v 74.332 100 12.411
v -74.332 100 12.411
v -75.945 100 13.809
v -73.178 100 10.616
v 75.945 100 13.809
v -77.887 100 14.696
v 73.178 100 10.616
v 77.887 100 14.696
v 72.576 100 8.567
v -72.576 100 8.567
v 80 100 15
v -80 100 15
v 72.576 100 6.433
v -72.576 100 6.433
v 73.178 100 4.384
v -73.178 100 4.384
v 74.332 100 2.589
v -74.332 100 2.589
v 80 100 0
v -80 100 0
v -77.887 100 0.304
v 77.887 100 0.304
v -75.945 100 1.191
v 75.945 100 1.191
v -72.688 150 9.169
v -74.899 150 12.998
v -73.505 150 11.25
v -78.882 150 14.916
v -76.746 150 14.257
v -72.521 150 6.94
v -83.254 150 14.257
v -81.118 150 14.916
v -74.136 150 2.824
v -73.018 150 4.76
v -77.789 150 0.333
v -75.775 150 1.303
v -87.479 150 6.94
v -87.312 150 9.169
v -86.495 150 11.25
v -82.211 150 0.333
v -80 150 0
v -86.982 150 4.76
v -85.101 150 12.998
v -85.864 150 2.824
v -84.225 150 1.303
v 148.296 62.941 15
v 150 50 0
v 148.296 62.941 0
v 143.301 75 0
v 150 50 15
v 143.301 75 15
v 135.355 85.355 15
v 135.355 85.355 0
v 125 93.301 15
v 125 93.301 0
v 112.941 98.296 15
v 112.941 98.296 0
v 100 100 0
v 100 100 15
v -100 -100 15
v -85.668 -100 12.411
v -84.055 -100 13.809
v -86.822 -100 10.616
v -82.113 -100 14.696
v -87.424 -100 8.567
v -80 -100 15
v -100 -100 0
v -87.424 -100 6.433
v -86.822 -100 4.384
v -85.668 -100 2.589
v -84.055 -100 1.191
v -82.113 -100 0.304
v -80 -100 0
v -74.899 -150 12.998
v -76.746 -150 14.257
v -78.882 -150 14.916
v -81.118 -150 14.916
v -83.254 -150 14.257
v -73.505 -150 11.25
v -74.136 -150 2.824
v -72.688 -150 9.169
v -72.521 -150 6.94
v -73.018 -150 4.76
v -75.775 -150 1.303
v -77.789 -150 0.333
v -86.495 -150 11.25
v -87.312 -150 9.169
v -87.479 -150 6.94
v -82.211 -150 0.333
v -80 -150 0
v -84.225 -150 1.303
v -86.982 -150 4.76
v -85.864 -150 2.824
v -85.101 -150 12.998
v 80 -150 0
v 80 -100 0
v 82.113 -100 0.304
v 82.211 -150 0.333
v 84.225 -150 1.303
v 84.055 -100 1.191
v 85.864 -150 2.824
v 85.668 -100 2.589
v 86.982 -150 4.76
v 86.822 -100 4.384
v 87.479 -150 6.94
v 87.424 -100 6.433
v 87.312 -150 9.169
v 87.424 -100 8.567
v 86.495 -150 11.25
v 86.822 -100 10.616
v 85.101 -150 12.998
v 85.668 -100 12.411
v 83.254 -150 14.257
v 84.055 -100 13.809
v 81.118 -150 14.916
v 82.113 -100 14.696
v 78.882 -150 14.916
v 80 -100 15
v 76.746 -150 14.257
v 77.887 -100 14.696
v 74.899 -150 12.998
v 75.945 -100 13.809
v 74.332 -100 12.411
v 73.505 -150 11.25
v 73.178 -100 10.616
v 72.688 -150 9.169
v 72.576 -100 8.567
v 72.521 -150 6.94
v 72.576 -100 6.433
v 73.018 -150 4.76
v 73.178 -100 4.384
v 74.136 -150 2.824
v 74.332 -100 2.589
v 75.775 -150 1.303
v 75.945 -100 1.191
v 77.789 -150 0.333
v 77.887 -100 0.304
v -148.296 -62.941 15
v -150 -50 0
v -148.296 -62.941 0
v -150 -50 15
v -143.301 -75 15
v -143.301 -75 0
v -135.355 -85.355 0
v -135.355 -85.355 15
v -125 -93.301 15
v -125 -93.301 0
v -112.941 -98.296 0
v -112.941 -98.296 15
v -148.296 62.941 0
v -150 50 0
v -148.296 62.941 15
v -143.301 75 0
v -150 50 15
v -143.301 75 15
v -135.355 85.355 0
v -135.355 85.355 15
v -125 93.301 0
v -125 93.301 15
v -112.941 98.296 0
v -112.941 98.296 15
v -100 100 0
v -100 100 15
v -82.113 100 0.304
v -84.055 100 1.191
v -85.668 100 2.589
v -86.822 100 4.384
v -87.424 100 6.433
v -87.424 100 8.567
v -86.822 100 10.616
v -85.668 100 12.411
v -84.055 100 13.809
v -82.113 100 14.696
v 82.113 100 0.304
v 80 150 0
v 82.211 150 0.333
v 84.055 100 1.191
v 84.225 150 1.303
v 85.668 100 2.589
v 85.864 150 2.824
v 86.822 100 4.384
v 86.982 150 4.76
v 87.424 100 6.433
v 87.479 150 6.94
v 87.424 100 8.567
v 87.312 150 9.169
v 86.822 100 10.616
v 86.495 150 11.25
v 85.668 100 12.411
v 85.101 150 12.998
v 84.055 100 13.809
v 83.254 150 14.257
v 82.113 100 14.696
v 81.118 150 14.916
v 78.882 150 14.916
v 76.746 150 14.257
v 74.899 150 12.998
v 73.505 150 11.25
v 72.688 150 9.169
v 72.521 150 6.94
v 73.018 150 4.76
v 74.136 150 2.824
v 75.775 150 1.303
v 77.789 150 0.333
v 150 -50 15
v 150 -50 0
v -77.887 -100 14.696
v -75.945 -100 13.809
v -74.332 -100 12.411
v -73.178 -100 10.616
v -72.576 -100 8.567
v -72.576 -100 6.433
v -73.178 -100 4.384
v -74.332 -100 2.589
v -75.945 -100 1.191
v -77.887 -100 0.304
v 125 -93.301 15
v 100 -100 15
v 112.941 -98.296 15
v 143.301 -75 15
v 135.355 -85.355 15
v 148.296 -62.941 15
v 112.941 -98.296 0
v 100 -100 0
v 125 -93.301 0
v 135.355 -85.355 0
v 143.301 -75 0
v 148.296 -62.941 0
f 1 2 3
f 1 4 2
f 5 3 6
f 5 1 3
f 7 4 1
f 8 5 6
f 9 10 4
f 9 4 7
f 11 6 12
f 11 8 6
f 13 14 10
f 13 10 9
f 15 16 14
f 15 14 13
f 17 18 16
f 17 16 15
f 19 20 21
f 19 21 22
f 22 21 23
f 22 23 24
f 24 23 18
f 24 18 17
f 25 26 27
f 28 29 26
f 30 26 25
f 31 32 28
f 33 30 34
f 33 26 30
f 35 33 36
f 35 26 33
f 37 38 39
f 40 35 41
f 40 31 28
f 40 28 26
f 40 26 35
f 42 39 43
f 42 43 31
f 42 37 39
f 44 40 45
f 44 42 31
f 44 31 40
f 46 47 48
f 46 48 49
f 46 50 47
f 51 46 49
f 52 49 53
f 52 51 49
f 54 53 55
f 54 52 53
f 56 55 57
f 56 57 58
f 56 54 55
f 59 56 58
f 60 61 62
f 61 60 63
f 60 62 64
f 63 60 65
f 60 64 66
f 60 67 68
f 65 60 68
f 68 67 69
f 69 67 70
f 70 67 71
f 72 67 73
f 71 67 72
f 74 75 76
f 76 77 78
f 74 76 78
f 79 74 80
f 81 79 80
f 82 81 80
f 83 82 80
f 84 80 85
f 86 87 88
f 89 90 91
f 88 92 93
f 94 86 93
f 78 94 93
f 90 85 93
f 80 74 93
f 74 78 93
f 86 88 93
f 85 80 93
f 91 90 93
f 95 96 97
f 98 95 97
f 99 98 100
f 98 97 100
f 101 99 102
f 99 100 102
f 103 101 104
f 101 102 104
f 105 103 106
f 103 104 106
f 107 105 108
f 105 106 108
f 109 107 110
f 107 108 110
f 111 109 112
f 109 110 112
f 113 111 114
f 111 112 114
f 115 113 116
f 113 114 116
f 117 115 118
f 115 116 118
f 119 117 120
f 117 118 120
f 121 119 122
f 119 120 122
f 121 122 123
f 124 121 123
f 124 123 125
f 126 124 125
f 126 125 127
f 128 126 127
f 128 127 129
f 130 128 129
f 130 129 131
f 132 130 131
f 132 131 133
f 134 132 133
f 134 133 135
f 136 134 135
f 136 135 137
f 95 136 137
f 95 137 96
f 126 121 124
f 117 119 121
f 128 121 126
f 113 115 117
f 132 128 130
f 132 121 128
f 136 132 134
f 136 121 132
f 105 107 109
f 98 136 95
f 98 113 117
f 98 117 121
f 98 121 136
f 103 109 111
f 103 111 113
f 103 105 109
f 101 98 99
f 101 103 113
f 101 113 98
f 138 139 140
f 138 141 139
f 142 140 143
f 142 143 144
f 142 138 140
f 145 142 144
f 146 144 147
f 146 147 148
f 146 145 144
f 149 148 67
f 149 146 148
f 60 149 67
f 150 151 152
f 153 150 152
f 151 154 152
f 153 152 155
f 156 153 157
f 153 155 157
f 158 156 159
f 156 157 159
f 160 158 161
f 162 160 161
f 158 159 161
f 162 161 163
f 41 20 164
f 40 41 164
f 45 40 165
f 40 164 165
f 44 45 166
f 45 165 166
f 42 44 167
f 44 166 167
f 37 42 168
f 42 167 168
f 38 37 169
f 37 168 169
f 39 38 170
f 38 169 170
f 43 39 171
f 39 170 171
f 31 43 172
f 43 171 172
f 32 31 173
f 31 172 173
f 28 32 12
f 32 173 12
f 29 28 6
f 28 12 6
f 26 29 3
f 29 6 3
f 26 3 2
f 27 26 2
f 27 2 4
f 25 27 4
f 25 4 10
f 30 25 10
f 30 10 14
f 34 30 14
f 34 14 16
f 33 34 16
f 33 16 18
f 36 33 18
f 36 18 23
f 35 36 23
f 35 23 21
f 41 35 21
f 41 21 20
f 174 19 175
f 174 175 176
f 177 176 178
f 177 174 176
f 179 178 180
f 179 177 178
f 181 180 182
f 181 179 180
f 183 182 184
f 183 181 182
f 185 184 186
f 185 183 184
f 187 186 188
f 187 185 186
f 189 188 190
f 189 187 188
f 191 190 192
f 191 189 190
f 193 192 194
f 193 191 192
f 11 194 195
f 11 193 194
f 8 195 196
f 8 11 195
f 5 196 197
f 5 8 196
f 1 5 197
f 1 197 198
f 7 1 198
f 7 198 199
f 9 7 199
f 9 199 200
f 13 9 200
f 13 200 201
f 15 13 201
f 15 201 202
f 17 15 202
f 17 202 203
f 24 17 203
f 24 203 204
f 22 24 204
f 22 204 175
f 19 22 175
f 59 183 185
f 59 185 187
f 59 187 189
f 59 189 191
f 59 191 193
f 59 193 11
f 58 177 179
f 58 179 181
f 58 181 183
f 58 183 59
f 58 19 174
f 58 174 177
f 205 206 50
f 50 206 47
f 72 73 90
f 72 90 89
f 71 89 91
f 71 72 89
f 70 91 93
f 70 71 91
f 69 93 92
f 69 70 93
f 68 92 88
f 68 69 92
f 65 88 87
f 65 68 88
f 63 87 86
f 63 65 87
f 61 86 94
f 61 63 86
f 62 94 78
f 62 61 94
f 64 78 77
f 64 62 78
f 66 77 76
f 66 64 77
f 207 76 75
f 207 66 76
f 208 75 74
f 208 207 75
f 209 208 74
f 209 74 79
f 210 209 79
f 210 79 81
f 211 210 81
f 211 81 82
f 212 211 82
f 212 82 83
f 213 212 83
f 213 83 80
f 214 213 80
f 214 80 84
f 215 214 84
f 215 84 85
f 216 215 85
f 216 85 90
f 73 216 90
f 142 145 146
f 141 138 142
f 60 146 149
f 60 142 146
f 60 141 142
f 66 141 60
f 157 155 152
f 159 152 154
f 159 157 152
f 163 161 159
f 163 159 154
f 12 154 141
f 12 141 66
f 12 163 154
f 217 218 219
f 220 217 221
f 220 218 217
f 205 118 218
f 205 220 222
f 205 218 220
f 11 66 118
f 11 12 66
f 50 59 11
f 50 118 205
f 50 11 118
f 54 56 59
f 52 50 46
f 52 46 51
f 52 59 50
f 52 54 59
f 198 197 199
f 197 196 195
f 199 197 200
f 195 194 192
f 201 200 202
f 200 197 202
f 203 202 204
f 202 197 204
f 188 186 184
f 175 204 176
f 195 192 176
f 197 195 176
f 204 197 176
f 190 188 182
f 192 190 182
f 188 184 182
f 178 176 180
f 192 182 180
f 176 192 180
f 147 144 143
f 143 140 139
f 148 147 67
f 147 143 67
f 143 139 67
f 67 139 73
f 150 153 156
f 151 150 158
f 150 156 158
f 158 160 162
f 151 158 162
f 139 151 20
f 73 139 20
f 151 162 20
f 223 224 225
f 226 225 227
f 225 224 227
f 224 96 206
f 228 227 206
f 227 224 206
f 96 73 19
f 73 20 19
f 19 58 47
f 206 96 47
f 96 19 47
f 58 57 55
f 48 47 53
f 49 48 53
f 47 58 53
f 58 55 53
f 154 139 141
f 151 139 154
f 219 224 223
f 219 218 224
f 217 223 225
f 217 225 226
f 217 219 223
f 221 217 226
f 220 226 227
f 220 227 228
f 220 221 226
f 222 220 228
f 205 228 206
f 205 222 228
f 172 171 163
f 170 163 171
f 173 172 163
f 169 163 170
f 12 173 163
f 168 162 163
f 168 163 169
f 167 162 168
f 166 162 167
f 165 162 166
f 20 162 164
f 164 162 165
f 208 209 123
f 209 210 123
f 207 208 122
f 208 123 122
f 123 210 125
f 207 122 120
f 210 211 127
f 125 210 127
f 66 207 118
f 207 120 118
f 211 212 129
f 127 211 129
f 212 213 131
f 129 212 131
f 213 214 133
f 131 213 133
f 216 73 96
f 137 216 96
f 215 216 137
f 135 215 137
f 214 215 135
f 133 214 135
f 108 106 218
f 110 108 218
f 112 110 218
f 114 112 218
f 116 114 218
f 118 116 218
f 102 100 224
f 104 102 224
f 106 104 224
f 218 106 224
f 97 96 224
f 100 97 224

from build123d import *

# Parameters (mm, degrees)
SKETCH3_W               = 300
SKETCH3_H               = 200
BOSS_EXTRUDE1_DEPTH     = 15
FILLET1_R               = 50
SKETCH7_R               = 7.5
BOSS_EXTRUDE2_DEPTH     = 50
MIRROR2_COPY_1_SKETCH_R = 7.5
MIRROR2_COPY_1_DEPTH    = 50


with BuildPart() as part:
    # Sketch3 → Boss-Extrude1 (new body)
    with BuildSketch(Plane.XY):
        Rectangle(SKETCH3_W, SKETCH3_H)
    extrude(amount=BOSS_EXTRUDE1_DEPTH)

    # Fillet1
    fillet1_edges = [part.edges().sort_by_distance(p)[0] for p in [
        (150, -100, 7.5),
        (-150, -100, 7.5),
        (-150, 100, 7.5),
        (150, 100, 7.5),
    ]]
    fillet(fillet1_edges, radius=FILLET1_R)

    # Sketch7 → Boss-Extrude2 (add)
    with BuildSketch(Plane.XZ.offset(100)):
        with Locations(Location((80, 7.5, 0), (0, 0, 270))):
            Circle(SKETCH7_R)
    boss_extrude2 = extrude(amount=BOSS_EXTRUDE2_DEPTH)

    # Mirror1: Boss-Extrude2 across plane
    add(boss_extrude2.mirror(Plane(origin=(0, 0, 0), x_dir=(0, 0, 1), z_dir=(1, 0, 0))))

    # Mirror2: Boss-Extrude2 across plane
    add(boss_extrude2.mirror(Plane.ZX))

    # Mirror2 copy 1 sketch → Mirror2 copy 1 (add)
    with BuildSketch(Plane(origin=(0, 100, 0), x_dir=(-1, 0, 0), z_dir=(0, 1, 0))):
        with Locations(Location((80, 7.5, 0), (0, 0, 270))):
            Circle(MIRROR2_COPY_1_SKETCH_R)
    extrude(amount=MIRROR2_COPY_1_DEPTH)


solid = part.part
